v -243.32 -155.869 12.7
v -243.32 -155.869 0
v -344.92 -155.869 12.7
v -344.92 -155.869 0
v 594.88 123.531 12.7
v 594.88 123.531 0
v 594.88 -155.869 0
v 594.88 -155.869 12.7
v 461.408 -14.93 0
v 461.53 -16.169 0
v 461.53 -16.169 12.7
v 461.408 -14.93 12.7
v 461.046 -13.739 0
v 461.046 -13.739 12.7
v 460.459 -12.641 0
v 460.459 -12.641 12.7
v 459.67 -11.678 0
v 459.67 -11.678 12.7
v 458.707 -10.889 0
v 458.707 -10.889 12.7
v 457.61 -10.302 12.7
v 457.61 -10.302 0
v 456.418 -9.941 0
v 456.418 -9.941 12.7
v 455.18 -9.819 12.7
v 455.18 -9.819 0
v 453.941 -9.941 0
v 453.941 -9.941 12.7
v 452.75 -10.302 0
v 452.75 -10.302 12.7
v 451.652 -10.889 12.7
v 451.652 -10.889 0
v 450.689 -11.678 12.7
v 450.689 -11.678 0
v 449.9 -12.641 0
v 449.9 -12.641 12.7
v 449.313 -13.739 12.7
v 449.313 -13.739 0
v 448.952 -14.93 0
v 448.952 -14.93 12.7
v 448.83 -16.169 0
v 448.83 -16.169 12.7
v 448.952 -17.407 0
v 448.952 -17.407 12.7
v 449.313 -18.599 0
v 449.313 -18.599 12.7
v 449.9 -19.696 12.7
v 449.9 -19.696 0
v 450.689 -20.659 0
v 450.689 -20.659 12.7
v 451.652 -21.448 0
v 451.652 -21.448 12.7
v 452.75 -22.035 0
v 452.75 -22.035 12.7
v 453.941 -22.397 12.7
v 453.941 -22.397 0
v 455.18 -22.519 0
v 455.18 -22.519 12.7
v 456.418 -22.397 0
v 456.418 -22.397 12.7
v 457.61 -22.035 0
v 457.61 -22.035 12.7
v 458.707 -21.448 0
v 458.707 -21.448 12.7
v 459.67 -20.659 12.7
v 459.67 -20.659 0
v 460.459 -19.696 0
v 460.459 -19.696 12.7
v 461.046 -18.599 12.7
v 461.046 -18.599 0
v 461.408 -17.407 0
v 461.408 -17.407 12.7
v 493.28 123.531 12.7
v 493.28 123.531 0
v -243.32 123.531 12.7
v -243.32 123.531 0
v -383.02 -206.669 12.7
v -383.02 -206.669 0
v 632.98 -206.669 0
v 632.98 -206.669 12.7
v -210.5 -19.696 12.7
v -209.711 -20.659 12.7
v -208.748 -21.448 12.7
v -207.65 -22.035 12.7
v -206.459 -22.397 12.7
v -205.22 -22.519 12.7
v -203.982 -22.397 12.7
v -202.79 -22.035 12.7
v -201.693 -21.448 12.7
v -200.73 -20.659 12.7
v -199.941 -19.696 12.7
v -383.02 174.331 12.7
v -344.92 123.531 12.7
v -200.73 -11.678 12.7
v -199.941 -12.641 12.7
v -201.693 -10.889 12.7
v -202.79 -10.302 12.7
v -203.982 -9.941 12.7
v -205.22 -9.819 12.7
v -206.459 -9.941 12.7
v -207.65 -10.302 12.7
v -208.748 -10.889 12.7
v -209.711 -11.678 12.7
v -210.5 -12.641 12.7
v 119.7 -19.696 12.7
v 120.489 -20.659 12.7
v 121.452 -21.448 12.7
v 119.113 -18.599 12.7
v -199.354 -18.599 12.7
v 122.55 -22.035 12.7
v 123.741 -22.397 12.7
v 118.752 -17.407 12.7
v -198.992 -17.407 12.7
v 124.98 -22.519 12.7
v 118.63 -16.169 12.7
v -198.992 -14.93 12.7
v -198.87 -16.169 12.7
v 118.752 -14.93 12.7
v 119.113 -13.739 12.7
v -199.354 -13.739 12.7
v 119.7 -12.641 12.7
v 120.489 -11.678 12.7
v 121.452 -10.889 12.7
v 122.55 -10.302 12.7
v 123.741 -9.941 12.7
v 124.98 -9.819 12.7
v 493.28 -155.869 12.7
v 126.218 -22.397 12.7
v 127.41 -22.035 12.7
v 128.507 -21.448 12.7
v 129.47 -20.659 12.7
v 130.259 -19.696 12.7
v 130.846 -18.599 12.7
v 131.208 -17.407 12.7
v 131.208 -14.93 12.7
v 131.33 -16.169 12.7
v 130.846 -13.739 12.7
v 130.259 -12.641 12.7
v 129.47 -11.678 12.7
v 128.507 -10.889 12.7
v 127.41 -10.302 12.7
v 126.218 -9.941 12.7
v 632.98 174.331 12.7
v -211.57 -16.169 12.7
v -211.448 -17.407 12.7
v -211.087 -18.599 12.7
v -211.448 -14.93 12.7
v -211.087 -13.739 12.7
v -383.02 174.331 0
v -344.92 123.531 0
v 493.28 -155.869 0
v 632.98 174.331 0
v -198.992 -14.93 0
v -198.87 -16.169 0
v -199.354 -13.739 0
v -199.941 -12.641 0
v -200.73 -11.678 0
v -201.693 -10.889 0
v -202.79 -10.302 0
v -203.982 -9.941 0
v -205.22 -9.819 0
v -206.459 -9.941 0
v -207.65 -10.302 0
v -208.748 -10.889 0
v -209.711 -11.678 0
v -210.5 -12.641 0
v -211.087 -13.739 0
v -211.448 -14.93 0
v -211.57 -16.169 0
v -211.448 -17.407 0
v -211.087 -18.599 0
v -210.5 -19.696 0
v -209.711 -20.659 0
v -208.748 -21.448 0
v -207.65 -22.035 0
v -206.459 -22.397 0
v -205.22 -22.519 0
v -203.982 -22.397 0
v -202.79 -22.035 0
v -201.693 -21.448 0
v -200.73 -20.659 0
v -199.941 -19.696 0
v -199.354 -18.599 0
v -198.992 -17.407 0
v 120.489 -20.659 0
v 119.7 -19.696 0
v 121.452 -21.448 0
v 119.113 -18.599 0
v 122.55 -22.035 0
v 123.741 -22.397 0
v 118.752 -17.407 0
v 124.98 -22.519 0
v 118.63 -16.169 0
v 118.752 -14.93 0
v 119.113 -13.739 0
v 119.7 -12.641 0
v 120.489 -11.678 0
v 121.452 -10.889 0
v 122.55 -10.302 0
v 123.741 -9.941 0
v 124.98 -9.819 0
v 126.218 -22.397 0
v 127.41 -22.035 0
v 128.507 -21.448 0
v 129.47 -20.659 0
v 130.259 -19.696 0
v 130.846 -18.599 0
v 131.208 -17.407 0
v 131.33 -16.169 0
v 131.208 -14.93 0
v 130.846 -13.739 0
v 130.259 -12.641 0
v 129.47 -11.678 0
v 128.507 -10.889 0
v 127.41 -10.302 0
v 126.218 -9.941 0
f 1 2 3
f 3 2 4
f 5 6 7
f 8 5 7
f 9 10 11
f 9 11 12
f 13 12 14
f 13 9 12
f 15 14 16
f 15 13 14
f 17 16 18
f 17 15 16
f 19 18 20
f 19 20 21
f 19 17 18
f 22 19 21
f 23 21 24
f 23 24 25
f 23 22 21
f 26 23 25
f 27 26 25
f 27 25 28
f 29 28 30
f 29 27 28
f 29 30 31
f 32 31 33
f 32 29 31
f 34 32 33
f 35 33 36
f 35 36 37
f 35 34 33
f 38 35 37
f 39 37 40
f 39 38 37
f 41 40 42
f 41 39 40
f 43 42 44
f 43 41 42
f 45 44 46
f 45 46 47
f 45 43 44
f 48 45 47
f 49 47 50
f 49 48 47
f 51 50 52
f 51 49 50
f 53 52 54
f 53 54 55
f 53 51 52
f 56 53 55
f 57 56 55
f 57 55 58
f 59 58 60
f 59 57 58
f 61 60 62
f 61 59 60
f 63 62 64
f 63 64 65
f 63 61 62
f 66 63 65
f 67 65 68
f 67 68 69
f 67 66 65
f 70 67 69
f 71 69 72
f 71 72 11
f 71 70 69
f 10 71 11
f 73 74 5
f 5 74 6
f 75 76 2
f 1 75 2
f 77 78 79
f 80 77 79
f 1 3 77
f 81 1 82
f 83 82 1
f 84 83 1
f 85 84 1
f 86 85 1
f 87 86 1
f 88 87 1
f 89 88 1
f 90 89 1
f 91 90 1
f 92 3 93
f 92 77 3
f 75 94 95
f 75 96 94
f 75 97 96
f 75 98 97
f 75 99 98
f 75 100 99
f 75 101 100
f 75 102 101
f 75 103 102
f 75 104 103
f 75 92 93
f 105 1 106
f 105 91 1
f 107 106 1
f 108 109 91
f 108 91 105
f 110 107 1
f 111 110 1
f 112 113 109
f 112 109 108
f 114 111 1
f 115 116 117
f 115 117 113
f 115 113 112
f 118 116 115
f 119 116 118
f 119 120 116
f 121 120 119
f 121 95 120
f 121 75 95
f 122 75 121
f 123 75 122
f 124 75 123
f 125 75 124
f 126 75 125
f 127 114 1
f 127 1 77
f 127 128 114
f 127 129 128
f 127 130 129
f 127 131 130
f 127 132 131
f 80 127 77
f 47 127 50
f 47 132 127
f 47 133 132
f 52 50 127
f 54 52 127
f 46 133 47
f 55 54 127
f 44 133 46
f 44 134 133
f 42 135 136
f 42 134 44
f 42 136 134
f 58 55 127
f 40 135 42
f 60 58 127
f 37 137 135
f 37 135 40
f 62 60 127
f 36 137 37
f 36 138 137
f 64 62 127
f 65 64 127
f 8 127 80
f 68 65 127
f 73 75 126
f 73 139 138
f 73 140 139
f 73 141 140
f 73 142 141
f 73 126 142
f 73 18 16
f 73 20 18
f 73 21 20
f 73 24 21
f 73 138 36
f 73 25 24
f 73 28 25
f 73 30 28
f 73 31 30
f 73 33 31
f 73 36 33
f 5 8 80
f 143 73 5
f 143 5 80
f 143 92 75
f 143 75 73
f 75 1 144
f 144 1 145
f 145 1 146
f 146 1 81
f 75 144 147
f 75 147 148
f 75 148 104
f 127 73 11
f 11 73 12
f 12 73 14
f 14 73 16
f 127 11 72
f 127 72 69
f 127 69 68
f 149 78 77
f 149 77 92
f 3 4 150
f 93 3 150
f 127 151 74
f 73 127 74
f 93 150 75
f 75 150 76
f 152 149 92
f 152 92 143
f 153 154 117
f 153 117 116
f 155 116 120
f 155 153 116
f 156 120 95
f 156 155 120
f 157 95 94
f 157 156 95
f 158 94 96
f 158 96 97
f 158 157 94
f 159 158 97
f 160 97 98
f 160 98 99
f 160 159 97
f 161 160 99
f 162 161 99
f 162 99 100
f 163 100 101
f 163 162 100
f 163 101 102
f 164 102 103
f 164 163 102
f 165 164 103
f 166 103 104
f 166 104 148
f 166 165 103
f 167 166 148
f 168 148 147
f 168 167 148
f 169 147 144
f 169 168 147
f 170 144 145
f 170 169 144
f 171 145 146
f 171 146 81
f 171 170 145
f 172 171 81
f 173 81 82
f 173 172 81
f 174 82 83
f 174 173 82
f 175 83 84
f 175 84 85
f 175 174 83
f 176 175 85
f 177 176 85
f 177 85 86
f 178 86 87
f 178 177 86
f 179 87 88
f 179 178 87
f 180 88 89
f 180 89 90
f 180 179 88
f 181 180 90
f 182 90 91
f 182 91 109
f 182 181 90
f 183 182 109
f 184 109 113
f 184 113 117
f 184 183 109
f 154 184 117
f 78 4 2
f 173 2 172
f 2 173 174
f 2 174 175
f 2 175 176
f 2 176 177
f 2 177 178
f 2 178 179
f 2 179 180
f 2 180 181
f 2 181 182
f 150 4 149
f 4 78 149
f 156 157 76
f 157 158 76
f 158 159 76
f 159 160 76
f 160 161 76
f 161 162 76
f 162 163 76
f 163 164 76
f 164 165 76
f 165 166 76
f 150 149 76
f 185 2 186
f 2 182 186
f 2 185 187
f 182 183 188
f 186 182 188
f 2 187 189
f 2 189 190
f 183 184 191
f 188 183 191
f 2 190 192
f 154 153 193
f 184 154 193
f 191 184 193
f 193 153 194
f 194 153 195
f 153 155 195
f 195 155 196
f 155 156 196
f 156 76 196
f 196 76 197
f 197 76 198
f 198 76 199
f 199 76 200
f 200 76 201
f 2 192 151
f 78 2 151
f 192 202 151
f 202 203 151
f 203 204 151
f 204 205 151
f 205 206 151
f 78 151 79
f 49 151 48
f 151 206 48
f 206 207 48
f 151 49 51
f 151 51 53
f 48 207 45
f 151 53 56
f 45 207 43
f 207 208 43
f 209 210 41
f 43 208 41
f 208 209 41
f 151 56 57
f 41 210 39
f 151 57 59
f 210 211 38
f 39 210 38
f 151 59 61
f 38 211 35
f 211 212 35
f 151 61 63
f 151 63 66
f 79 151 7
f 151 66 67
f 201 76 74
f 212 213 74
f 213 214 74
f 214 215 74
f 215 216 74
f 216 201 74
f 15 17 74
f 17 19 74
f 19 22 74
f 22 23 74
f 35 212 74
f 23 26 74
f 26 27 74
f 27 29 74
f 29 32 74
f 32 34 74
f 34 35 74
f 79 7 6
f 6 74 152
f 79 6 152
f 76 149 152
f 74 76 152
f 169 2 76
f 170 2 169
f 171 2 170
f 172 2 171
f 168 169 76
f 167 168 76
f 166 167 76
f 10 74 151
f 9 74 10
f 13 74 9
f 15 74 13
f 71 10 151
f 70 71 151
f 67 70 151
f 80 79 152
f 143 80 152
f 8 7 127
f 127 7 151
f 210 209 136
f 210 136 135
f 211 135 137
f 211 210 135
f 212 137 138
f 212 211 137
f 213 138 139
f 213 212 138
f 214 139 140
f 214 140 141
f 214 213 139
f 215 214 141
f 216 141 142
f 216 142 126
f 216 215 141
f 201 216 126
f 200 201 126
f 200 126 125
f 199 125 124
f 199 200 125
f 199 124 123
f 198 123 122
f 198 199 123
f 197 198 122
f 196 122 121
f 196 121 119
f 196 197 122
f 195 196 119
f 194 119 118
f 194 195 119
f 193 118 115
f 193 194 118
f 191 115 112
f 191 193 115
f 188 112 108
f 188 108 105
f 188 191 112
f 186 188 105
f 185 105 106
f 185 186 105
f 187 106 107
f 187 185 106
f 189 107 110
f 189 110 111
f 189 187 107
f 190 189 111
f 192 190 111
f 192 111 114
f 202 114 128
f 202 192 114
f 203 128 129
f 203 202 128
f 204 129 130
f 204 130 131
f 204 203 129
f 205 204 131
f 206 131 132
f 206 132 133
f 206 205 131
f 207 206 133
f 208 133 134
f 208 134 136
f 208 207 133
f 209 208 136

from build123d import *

# Parameters (mm, degrees)
F0_W     = 1016
F0_H     = 381
F0_R     = 6.35
F1_DEPTH = 12.7


with BuildPart() as f1:
    # F0 (on Top) → F1 (new body)
    with BuildSketch(Plane.XY):
        with Locations((124.979544, -16.168576)):
            Rectangle(F0_W, F0_H)
        Polygon((-344.920456, -155.868576), (-344.920456, -16.168576), (-344.920456, 123.531424), (-243.320456, 123.531424), (-243.320456, -155.868576), align=None, mode=Mode.SUBTRACT)
        with Locations((-205.220456, -16.168576)):
            Circle(F0_R, mode=Mode.SUBTRACT)
        with Locations((124.979544, -16.168576)):
            Circle(F0_R, mode=Mode.SUBTRACT)
        with Locations((455.179544, -16.168576)):
            Circle(F0_R, mode=Mode.SUBTRACT)
        Polygon((493.279544, -155.868576), (493.279544, 123.531424), (594.879544, 123.531424), (594.879544, -16.168576), (594.879544, -155.868576), align=None, mode=Mode.SUBTRACT)
    extrude(amount=F1_DEPTH)


solid = f1.part
